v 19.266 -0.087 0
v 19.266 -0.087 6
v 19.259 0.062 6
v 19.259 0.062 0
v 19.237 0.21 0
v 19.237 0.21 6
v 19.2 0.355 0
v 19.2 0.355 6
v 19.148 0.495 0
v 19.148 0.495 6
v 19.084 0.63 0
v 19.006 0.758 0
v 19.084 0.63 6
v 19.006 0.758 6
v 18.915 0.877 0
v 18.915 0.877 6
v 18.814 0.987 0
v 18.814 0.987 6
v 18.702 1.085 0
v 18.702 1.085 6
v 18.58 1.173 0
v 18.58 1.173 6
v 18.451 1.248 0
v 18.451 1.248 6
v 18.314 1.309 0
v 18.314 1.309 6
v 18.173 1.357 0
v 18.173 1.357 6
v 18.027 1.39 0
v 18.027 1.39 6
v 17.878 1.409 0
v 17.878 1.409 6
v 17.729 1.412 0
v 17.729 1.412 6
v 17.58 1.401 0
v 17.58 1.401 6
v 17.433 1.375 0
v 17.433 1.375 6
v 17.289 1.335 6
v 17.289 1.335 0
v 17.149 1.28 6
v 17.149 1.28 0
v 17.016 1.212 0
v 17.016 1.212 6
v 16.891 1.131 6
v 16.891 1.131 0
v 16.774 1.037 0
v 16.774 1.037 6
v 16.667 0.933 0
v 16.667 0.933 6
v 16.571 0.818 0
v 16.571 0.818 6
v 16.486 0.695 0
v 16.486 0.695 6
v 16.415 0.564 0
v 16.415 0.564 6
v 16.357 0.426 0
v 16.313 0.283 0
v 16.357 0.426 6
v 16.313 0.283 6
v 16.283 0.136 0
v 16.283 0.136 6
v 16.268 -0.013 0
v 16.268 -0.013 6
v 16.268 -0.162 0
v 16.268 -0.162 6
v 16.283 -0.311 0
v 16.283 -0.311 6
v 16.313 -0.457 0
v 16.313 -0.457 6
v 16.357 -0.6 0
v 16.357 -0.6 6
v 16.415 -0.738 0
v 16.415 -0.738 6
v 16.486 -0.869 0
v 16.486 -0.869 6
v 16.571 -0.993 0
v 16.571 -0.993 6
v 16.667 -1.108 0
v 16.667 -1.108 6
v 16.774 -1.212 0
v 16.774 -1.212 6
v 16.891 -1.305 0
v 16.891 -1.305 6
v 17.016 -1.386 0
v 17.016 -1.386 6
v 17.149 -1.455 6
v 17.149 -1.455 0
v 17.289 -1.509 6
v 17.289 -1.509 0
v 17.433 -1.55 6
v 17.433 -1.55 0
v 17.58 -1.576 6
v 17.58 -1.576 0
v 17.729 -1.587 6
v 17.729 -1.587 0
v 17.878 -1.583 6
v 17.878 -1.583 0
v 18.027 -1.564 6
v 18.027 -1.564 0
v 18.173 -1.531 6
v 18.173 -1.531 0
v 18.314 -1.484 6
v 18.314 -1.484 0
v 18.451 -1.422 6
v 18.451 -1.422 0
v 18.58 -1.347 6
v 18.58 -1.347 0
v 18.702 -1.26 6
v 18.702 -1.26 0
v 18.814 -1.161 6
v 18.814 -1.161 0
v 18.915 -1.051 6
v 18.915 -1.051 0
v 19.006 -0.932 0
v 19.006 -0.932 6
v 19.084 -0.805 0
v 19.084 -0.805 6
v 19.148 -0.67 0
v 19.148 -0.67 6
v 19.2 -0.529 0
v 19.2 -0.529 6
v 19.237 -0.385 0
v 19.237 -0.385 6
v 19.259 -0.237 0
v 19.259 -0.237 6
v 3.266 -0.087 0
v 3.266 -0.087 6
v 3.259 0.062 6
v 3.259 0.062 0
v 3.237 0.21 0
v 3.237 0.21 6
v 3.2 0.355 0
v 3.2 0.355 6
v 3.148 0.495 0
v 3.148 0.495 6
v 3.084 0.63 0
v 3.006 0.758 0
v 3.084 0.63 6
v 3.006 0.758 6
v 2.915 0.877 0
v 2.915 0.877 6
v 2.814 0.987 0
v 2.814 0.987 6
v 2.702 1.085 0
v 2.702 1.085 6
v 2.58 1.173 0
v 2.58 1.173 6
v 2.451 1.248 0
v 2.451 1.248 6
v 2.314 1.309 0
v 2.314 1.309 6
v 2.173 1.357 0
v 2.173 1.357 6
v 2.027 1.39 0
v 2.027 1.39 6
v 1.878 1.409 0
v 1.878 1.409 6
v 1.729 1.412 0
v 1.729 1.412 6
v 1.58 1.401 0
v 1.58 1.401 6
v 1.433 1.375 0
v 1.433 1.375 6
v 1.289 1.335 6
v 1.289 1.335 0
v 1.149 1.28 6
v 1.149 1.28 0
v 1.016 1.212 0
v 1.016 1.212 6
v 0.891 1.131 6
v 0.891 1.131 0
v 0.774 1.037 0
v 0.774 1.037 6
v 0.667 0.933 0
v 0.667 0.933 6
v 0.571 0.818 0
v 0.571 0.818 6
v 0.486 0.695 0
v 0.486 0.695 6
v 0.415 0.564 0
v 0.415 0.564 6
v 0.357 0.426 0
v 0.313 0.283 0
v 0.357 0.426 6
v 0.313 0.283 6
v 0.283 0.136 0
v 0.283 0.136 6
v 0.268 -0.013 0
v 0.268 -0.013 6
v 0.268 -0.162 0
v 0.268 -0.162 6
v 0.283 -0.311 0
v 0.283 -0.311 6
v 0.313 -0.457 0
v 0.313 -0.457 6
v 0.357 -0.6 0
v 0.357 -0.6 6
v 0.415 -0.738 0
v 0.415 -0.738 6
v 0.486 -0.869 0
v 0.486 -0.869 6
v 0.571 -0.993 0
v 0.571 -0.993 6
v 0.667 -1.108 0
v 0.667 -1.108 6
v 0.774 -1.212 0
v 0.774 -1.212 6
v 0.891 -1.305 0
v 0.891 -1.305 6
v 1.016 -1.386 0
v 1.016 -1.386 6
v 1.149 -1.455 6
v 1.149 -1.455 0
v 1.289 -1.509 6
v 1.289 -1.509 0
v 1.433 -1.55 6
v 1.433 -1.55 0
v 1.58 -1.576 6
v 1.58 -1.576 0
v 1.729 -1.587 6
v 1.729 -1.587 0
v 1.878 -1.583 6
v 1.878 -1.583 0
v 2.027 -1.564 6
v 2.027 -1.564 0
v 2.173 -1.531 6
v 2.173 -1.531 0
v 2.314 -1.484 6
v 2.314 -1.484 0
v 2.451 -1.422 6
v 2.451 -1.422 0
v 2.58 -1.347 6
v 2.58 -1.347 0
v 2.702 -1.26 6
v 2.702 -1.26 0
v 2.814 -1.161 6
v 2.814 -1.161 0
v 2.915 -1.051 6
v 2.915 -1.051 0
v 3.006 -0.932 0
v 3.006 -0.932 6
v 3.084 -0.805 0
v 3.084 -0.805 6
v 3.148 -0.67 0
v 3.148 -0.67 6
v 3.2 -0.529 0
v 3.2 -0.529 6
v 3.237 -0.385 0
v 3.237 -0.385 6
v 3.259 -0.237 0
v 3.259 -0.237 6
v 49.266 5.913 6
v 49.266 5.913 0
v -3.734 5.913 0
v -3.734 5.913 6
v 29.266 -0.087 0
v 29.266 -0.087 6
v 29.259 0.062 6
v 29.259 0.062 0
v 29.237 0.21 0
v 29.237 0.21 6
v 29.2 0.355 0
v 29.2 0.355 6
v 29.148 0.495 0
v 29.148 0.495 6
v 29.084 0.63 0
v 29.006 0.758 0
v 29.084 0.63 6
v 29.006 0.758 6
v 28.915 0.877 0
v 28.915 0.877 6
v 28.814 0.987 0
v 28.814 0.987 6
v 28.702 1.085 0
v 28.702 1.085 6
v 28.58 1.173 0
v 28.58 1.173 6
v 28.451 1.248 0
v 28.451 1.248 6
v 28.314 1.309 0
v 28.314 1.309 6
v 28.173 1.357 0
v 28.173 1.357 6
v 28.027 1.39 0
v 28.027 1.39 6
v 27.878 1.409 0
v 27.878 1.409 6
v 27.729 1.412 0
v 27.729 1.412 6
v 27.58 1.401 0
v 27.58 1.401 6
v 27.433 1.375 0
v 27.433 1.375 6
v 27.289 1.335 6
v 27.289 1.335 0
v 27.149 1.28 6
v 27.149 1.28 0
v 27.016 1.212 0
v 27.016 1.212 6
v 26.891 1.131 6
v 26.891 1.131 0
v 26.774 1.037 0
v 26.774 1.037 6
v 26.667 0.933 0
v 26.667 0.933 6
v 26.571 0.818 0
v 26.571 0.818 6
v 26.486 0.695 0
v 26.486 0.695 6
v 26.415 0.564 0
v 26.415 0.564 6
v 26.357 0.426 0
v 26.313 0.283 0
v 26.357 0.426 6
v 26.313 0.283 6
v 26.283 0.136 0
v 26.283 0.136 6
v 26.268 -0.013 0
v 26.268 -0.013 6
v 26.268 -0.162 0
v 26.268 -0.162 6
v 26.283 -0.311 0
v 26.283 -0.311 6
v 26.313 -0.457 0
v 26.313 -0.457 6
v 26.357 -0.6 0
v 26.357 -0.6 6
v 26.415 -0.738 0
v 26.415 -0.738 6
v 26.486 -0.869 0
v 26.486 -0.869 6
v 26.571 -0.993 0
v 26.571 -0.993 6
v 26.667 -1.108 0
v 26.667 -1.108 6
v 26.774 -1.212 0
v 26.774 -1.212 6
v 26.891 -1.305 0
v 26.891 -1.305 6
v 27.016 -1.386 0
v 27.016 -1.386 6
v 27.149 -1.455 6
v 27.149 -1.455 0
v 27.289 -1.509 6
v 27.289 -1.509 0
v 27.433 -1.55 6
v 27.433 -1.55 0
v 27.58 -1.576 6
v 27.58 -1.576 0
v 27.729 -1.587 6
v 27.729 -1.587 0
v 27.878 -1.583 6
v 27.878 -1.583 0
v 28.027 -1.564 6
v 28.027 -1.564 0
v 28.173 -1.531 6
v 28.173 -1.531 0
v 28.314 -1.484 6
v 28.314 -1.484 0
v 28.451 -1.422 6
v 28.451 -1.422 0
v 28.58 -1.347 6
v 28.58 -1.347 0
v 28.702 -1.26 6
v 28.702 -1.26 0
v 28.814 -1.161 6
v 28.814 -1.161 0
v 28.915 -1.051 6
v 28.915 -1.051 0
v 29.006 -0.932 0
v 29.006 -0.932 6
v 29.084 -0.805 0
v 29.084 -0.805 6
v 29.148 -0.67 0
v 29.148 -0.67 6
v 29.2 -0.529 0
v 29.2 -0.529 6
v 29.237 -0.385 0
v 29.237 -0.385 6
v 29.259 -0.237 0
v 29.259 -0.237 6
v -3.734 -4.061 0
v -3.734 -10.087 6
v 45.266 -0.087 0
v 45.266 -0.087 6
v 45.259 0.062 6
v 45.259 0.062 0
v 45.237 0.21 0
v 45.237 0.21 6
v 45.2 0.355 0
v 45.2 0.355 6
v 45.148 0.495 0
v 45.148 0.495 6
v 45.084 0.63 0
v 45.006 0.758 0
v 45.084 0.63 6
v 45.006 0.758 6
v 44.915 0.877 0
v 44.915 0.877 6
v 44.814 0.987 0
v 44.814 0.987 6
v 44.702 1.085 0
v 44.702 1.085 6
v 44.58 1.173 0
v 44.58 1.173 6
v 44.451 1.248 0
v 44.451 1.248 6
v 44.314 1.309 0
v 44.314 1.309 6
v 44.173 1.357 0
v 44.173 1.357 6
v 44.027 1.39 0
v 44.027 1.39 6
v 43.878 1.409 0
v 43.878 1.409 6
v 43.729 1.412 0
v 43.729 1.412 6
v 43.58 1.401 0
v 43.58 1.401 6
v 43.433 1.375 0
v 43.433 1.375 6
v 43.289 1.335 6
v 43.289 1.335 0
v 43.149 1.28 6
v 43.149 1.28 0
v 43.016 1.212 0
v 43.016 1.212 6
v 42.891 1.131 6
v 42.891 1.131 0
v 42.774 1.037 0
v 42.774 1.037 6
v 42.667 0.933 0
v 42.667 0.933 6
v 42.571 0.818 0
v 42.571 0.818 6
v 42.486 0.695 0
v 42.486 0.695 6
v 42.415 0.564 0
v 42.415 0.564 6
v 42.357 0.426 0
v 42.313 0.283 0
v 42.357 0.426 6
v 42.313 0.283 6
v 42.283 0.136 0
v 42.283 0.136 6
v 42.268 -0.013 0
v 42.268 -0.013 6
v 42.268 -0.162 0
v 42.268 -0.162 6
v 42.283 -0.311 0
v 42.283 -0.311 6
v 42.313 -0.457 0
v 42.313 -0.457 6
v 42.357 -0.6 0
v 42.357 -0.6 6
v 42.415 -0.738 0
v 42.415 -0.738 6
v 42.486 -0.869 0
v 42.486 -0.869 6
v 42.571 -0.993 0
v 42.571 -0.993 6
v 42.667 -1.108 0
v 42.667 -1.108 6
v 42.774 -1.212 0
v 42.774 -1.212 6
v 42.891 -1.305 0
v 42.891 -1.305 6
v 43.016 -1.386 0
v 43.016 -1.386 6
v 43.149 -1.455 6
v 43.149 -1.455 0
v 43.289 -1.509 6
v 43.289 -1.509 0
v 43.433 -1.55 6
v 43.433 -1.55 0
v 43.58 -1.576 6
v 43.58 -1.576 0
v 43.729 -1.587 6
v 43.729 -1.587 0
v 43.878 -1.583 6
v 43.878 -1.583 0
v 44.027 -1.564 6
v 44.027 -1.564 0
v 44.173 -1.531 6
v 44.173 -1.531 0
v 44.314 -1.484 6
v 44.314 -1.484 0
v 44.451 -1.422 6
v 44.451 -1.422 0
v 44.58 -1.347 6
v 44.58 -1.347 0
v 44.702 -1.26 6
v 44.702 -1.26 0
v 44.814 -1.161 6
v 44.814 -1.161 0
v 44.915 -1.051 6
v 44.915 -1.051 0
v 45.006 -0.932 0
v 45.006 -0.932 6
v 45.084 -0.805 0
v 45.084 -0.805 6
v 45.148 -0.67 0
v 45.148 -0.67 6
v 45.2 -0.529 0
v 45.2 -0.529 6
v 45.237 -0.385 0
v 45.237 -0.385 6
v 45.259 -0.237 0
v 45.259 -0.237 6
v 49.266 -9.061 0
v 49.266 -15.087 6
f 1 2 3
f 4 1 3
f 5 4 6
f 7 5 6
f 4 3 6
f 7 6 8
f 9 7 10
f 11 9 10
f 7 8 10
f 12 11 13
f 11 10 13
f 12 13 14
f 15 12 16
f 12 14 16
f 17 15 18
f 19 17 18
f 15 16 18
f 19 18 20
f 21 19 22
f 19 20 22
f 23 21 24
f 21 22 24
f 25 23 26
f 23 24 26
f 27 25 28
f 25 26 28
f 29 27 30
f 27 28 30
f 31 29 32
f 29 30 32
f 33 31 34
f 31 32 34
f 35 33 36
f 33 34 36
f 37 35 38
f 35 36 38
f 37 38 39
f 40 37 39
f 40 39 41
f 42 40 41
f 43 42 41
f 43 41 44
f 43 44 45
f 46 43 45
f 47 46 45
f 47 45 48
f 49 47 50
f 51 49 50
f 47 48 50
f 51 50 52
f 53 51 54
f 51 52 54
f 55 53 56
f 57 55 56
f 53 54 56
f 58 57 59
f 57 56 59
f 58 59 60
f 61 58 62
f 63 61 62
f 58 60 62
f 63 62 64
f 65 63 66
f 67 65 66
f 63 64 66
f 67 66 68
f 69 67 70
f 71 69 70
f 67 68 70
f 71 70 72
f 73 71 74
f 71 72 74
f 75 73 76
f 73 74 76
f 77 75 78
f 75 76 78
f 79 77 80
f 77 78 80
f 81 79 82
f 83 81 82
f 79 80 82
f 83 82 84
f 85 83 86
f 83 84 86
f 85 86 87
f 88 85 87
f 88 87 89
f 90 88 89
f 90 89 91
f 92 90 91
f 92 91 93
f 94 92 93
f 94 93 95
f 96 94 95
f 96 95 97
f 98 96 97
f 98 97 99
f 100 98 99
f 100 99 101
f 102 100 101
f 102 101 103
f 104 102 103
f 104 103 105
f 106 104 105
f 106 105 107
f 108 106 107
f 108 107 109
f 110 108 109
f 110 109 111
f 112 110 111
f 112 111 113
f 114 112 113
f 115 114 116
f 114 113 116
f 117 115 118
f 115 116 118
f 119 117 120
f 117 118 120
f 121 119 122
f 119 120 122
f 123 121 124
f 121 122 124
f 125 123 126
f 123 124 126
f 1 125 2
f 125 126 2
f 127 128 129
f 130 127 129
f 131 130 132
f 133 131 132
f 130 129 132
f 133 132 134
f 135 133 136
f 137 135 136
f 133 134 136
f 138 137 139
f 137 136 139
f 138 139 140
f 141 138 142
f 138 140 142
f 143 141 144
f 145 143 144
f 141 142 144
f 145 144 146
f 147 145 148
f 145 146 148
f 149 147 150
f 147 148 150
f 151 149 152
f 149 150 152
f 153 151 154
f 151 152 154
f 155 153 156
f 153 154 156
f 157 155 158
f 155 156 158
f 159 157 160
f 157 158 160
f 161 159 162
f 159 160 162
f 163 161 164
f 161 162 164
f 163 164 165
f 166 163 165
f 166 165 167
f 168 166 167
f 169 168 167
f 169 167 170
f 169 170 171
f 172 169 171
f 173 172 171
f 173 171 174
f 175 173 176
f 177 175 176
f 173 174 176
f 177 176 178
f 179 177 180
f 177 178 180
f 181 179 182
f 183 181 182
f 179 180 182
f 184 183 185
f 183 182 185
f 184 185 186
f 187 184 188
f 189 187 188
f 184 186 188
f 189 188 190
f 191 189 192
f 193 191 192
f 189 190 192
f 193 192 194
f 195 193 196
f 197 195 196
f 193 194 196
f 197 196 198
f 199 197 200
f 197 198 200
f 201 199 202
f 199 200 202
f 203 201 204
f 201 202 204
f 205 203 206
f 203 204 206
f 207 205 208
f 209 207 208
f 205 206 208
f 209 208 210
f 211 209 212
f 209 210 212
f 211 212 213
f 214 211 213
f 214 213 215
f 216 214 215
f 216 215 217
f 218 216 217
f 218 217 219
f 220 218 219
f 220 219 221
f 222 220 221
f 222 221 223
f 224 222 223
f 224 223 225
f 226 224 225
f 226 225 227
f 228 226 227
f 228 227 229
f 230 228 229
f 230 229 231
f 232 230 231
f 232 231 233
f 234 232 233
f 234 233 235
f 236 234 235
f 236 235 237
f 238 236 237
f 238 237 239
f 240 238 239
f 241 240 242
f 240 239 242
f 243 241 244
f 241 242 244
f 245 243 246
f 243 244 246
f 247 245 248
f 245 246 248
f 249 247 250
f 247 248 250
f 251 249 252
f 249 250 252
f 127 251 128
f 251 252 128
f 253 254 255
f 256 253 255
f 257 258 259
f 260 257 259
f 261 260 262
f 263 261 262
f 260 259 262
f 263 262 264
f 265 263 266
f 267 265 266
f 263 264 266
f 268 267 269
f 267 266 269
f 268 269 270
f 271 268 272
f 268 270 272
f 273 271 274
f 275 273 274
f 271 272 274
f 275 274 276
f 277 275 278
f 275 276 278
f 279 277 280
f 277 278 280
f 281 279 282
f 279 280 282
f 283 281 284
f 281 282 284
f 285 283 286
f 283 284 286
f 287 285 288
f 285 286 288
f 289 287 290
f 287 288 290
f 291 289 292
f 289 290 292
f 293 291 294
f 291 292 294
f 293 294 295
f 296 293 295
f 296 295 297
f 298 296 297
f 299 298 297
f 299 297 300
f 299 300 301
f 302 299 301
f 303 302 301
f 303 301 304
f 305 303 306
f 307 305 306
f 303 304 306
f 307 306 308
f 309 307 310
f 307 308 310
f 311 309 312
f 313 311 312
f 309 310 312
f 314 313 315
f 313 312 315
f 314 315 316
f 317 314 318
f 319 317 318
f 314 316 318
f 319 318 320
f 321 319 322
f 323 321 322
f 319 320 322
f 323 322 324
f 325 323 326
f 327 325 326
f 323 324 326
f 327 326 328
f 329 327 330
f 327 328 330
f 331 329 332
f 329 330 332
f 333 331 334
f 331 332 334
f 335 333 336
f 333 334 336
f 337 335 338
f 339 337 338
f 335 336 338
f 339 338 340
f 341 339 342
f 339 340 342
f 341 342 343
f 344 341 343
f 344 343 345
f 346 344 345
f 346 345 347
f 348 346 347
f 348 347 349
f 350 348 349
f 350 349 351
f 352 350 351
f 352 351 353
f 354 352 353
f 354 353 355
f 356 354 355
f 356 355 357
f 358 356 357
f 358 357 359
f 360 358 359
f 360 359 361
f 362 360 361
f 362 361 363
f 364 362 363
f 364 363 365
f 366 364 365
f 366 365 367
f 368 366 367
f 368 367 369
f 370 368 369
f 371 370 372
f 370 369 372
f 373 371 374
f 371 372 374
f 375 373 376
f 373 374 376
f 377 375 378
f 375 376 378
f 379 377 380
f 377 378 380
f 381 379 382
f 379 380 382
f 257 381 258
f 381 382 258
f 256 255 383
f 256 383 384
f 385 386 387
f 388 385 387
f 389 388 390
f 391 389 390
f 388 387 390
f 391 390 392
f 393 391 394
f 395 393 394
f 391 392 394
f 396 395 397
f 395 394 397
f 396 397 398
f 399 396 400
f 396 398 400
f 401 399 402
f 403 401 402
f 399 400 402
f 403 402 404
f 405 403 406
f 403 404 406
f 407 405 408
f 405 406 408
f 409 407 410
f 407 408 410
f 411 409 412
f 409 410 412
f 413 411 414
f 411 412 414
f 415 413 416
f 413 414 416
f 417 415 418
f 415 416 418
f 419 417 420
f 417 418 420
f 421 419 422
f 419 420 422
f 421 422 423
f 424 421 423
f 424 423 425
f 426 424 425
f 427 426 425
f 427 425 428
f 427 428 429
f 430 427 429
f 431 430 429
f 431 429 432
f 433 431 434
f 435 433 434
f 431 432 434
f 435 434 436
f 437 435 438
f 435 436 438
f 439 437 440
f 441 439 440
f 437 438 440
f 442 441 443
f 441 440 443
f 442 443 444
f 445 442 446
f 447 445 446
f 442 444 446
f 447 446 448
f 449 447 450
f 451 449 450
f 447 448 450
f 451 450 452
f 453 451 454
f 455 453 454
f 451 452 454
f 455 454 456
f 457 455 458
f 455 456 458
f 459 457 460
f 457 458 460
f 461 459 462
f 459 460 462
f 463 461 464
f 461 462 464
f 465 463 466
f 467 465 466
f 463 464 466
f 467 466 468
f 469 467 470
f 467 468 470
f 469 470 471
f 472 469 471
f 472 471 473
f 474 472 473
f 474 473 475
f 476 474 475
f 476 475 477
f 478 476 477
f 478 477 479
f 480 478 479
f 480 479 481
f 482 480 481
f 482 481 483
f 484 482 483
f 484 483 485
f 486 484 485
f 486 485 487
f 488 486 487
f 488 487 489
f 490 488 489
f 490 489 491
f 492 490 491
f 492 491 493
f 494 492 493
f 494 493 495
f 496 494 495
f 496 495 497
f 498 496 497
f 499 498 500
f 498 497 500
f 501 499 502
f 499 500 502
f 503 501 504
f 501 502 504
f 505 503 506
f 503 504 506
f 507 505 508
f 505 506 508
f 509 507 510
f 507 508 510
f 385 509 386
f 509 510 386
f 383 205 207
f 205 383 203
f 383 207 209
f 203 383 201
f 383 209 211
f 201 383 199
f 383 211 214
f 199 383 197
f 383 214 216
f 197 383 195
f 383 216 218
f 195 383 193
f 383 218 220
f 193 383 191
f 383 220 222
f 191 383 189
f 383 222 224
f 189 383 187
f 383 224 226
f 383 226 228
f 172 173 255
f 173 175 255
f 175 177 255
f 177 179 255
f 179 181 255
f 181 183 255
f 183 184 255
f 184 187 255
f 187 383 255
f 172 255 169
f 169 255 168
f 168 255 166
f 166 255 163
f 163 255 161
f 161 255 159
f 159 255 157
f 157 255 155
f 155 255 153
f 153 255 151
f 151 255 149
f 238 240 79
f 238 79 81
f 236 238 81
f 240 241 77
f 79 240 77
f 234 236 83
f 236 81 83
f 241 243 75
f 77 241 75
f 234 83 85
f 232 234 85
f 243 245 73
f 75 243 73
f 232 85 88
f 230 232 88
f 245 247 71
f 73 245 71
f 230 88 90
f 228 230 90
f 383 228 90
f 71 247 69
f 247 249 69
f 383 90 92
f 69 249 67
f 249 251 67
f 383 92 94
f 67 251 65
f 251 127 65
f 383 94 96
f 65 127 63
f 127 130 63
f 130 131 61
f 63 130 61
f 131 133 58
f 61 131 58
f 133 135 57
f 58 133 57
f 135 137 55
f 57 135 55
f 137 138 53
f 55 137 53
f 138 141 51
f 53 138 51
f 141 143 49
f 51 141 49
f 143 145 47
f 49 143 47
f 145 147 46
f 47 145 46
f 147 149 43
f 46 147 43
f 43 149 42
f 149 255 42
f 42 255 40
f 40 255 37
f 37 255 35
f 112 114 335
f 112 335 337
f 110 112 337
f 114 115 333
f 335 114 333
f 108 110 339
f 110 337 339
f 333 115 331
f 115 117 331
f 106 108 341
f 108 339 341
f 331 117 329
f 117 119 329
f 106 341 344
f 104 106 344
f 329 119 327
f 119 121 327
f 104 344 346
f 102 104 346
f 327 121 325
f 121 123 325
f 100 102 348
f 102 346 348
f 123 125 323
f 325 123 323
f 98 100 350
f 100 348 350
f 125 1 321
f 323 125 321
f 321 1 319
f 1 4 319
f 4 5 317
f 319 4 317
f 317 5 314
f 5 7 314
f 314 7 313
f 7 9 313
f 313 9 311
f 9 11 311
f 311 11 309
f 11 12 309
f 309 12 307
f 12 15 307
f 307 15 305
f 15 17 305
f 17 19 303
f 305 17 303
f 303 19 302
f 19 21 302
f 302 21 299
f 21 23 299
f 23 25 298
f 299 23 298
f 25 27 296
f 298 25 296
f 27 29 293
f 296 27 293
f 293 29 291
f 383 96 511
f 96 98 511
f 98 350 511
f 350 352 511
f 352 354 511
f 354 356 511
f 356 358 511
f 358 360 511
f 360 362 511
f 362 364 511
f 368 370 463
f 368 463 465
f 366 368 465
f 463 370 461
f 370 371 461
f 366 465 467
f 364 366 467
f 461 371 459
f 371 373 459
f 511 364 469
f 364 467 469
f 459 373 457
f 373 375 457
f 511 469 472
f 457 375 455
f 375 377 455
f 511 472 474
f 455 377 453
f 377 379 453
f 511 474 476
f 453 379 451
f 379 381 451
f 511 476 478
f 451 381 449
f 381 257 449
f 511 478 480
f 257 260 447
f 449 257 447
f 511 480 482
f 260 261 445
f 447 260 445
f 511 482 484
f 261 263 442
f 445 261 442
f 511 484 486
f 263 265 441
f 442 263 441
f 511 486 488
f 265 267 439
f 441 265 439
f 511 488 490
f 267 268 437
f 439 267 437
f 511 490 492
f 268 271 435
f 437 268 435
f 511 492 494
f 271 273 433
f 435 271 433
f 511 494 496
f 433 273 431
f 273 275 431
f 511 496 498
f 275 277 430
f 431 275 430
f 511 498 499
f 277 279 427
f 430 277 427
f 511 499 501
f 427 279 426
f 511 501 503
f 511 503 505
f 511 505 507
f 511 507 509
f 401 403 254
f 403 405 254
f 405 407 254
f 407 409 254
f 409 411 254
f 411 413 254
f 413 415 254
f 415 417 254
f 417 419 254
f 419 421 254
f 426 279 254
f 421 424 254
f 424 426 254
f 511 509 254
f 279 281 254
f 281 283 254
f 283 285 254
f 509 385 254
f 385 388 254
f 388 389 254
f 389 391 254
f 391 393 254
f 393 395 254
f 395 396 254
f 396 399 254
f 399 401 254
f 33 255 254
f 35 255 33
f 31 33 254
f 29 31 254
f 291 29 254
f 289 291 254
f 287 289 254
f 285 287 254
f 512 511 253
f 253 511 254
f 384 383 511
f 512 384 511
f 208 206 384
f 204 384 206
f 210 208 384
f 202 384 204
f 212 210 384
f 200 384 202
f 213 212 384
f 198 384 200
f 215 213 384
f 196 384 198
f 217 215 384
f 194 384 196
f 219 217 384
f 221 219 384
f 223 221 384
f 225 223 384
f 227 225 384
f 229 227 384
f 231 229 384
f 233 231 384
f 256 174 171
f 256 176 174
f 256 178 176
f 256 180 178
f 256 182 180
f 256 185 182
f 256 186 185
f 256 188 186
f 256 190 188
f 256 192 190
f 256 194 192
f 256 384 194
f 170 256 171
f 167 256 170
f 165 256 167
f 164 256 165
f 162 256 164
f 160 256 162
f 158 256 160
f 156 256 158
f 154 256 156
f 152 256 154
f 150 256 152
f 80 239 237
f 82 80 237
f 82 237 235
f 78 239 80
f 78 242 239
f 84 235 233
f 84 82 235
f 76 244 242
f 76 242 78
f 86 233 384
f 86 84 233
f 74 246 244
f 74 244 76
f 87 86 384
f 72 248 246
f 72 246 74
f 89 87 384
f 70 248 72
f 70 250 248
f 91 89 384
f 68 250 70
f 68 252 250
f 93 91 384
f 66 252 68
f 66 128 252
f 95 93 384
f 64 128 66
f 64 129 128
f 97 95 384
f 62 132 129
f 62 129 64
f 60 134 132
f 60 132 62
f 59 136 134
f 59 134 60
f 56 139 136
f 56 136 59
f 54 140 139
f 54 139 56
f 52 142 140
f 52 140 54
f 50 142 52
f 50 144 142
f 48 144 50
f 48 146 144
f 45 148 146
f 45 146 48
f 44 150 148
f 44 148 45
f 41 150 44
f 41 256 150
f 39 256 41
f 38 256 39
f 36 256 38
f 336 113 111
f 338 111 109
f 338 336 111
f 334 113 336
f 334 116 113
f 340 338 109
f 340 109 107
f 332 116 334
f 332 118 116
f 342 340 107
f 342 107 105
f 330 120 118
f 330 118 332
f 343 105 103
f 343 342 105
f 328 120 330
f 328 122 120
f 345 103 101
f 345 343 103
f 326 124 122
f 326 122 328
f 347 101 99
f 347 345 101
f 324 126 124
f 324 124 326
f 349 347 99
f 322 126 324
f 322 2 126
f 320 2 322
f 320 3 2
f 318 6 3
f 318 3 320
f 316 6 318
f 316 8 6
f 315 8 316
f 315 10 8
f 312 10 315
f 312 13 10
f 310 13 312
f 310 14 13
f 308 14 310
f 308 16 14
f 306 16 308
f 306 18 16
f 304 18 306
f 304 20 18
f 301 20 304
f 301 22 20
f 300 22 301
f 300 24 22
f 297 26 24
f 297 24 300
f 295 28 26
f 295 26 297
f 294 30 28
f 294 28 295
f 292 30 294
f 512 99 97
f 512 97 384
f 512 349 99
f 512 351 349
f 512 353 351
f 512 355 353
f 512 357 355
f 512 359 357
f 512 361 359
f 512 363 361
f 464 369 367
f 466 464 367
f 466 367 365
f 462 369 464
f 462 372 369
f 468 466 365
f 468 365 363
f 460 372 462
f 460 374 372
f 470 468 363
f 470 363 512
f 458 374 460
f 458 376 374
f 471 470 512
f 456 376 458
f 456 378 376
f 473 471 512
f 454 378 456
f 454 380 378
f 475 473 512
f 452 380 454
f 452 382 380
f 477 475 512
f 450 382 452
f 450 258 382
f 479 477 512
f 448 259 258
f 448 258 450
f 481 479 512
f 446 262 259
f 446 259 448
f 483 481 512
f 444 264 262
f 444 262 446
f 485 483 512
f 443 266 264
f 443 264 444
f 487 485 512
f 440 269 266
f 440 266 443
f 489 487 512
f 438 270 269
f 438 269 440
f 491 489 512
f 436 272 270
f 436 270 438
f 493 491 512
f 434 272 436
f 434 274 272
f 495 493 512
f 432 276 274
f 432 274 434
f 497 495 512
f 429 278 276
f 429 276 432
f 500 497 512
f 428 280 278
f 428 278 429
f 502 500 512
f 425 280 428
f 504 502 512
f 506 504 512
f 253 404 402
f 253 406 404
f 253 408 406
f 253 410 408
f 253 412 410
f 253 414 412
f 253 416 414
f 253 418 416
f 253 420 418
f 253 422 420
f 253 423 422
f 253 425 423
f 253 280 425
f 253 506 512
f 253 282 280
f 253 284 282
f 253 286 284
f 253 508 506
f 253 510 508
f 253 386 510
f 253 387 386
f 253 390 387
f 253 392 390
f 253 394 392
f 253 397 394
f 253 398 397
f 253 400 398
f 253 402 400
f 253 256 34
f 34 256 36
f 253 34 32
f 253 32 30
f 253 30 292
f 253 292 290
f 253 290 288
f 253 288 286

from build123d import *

# Parameters (mm, degrees)
F1_DEPTH = 6
F2_SIZE  = 5.99999
F3_R     = 1.5
F4_DEPTH = 6


# Not quite as in the source:
# - a fillet or chamfer is up to 0.001 mm smaller than in the source, because OpenCascade refuses the exact size


with BuildPart() as f1:
    # F0 (on Top) → F1 (new body)
    with BuildSketch(Plane.XY):
        Polygon((49.2662842423, 5.9127185345), (-3.7337157577, 5.9127185345), (-3.7337157577, -10.0872814655), (49.2662842423, -15.0872814655), align=None)
    extrude(amount=F1_DEPTH)

    # F2 (size 6 in the source; OpenCascade refuses exactly that, so slightly less here)
    f2_edges = [f1.edges().sort_by_distance(p)[0] for p in [
        (22.766284, -12.587281, 0),
    ]]
    chamfer(f2_edges, length=F2_SIZE)

    # F3 (on face) → F4 (cut, through all)
    with BuildSketch(Plane.XY.offset(6)):
        with Locations((1.7662842423, -0.0872814655)):
            Circle(F3_R)
        with Locations((17.7662842423, -0.0872814655)):
            Circle(F3_R)
        with Locations((27.7662842423, -0.0872814655)):
            Circle(F3_R)
        with Locations((43.7662842423, -0.0872814655)):
            Circle(F3_R)
    extrude(amount=-F4_DEPTH, mode=Mode.SUBTRACT)


solid = f1.part
